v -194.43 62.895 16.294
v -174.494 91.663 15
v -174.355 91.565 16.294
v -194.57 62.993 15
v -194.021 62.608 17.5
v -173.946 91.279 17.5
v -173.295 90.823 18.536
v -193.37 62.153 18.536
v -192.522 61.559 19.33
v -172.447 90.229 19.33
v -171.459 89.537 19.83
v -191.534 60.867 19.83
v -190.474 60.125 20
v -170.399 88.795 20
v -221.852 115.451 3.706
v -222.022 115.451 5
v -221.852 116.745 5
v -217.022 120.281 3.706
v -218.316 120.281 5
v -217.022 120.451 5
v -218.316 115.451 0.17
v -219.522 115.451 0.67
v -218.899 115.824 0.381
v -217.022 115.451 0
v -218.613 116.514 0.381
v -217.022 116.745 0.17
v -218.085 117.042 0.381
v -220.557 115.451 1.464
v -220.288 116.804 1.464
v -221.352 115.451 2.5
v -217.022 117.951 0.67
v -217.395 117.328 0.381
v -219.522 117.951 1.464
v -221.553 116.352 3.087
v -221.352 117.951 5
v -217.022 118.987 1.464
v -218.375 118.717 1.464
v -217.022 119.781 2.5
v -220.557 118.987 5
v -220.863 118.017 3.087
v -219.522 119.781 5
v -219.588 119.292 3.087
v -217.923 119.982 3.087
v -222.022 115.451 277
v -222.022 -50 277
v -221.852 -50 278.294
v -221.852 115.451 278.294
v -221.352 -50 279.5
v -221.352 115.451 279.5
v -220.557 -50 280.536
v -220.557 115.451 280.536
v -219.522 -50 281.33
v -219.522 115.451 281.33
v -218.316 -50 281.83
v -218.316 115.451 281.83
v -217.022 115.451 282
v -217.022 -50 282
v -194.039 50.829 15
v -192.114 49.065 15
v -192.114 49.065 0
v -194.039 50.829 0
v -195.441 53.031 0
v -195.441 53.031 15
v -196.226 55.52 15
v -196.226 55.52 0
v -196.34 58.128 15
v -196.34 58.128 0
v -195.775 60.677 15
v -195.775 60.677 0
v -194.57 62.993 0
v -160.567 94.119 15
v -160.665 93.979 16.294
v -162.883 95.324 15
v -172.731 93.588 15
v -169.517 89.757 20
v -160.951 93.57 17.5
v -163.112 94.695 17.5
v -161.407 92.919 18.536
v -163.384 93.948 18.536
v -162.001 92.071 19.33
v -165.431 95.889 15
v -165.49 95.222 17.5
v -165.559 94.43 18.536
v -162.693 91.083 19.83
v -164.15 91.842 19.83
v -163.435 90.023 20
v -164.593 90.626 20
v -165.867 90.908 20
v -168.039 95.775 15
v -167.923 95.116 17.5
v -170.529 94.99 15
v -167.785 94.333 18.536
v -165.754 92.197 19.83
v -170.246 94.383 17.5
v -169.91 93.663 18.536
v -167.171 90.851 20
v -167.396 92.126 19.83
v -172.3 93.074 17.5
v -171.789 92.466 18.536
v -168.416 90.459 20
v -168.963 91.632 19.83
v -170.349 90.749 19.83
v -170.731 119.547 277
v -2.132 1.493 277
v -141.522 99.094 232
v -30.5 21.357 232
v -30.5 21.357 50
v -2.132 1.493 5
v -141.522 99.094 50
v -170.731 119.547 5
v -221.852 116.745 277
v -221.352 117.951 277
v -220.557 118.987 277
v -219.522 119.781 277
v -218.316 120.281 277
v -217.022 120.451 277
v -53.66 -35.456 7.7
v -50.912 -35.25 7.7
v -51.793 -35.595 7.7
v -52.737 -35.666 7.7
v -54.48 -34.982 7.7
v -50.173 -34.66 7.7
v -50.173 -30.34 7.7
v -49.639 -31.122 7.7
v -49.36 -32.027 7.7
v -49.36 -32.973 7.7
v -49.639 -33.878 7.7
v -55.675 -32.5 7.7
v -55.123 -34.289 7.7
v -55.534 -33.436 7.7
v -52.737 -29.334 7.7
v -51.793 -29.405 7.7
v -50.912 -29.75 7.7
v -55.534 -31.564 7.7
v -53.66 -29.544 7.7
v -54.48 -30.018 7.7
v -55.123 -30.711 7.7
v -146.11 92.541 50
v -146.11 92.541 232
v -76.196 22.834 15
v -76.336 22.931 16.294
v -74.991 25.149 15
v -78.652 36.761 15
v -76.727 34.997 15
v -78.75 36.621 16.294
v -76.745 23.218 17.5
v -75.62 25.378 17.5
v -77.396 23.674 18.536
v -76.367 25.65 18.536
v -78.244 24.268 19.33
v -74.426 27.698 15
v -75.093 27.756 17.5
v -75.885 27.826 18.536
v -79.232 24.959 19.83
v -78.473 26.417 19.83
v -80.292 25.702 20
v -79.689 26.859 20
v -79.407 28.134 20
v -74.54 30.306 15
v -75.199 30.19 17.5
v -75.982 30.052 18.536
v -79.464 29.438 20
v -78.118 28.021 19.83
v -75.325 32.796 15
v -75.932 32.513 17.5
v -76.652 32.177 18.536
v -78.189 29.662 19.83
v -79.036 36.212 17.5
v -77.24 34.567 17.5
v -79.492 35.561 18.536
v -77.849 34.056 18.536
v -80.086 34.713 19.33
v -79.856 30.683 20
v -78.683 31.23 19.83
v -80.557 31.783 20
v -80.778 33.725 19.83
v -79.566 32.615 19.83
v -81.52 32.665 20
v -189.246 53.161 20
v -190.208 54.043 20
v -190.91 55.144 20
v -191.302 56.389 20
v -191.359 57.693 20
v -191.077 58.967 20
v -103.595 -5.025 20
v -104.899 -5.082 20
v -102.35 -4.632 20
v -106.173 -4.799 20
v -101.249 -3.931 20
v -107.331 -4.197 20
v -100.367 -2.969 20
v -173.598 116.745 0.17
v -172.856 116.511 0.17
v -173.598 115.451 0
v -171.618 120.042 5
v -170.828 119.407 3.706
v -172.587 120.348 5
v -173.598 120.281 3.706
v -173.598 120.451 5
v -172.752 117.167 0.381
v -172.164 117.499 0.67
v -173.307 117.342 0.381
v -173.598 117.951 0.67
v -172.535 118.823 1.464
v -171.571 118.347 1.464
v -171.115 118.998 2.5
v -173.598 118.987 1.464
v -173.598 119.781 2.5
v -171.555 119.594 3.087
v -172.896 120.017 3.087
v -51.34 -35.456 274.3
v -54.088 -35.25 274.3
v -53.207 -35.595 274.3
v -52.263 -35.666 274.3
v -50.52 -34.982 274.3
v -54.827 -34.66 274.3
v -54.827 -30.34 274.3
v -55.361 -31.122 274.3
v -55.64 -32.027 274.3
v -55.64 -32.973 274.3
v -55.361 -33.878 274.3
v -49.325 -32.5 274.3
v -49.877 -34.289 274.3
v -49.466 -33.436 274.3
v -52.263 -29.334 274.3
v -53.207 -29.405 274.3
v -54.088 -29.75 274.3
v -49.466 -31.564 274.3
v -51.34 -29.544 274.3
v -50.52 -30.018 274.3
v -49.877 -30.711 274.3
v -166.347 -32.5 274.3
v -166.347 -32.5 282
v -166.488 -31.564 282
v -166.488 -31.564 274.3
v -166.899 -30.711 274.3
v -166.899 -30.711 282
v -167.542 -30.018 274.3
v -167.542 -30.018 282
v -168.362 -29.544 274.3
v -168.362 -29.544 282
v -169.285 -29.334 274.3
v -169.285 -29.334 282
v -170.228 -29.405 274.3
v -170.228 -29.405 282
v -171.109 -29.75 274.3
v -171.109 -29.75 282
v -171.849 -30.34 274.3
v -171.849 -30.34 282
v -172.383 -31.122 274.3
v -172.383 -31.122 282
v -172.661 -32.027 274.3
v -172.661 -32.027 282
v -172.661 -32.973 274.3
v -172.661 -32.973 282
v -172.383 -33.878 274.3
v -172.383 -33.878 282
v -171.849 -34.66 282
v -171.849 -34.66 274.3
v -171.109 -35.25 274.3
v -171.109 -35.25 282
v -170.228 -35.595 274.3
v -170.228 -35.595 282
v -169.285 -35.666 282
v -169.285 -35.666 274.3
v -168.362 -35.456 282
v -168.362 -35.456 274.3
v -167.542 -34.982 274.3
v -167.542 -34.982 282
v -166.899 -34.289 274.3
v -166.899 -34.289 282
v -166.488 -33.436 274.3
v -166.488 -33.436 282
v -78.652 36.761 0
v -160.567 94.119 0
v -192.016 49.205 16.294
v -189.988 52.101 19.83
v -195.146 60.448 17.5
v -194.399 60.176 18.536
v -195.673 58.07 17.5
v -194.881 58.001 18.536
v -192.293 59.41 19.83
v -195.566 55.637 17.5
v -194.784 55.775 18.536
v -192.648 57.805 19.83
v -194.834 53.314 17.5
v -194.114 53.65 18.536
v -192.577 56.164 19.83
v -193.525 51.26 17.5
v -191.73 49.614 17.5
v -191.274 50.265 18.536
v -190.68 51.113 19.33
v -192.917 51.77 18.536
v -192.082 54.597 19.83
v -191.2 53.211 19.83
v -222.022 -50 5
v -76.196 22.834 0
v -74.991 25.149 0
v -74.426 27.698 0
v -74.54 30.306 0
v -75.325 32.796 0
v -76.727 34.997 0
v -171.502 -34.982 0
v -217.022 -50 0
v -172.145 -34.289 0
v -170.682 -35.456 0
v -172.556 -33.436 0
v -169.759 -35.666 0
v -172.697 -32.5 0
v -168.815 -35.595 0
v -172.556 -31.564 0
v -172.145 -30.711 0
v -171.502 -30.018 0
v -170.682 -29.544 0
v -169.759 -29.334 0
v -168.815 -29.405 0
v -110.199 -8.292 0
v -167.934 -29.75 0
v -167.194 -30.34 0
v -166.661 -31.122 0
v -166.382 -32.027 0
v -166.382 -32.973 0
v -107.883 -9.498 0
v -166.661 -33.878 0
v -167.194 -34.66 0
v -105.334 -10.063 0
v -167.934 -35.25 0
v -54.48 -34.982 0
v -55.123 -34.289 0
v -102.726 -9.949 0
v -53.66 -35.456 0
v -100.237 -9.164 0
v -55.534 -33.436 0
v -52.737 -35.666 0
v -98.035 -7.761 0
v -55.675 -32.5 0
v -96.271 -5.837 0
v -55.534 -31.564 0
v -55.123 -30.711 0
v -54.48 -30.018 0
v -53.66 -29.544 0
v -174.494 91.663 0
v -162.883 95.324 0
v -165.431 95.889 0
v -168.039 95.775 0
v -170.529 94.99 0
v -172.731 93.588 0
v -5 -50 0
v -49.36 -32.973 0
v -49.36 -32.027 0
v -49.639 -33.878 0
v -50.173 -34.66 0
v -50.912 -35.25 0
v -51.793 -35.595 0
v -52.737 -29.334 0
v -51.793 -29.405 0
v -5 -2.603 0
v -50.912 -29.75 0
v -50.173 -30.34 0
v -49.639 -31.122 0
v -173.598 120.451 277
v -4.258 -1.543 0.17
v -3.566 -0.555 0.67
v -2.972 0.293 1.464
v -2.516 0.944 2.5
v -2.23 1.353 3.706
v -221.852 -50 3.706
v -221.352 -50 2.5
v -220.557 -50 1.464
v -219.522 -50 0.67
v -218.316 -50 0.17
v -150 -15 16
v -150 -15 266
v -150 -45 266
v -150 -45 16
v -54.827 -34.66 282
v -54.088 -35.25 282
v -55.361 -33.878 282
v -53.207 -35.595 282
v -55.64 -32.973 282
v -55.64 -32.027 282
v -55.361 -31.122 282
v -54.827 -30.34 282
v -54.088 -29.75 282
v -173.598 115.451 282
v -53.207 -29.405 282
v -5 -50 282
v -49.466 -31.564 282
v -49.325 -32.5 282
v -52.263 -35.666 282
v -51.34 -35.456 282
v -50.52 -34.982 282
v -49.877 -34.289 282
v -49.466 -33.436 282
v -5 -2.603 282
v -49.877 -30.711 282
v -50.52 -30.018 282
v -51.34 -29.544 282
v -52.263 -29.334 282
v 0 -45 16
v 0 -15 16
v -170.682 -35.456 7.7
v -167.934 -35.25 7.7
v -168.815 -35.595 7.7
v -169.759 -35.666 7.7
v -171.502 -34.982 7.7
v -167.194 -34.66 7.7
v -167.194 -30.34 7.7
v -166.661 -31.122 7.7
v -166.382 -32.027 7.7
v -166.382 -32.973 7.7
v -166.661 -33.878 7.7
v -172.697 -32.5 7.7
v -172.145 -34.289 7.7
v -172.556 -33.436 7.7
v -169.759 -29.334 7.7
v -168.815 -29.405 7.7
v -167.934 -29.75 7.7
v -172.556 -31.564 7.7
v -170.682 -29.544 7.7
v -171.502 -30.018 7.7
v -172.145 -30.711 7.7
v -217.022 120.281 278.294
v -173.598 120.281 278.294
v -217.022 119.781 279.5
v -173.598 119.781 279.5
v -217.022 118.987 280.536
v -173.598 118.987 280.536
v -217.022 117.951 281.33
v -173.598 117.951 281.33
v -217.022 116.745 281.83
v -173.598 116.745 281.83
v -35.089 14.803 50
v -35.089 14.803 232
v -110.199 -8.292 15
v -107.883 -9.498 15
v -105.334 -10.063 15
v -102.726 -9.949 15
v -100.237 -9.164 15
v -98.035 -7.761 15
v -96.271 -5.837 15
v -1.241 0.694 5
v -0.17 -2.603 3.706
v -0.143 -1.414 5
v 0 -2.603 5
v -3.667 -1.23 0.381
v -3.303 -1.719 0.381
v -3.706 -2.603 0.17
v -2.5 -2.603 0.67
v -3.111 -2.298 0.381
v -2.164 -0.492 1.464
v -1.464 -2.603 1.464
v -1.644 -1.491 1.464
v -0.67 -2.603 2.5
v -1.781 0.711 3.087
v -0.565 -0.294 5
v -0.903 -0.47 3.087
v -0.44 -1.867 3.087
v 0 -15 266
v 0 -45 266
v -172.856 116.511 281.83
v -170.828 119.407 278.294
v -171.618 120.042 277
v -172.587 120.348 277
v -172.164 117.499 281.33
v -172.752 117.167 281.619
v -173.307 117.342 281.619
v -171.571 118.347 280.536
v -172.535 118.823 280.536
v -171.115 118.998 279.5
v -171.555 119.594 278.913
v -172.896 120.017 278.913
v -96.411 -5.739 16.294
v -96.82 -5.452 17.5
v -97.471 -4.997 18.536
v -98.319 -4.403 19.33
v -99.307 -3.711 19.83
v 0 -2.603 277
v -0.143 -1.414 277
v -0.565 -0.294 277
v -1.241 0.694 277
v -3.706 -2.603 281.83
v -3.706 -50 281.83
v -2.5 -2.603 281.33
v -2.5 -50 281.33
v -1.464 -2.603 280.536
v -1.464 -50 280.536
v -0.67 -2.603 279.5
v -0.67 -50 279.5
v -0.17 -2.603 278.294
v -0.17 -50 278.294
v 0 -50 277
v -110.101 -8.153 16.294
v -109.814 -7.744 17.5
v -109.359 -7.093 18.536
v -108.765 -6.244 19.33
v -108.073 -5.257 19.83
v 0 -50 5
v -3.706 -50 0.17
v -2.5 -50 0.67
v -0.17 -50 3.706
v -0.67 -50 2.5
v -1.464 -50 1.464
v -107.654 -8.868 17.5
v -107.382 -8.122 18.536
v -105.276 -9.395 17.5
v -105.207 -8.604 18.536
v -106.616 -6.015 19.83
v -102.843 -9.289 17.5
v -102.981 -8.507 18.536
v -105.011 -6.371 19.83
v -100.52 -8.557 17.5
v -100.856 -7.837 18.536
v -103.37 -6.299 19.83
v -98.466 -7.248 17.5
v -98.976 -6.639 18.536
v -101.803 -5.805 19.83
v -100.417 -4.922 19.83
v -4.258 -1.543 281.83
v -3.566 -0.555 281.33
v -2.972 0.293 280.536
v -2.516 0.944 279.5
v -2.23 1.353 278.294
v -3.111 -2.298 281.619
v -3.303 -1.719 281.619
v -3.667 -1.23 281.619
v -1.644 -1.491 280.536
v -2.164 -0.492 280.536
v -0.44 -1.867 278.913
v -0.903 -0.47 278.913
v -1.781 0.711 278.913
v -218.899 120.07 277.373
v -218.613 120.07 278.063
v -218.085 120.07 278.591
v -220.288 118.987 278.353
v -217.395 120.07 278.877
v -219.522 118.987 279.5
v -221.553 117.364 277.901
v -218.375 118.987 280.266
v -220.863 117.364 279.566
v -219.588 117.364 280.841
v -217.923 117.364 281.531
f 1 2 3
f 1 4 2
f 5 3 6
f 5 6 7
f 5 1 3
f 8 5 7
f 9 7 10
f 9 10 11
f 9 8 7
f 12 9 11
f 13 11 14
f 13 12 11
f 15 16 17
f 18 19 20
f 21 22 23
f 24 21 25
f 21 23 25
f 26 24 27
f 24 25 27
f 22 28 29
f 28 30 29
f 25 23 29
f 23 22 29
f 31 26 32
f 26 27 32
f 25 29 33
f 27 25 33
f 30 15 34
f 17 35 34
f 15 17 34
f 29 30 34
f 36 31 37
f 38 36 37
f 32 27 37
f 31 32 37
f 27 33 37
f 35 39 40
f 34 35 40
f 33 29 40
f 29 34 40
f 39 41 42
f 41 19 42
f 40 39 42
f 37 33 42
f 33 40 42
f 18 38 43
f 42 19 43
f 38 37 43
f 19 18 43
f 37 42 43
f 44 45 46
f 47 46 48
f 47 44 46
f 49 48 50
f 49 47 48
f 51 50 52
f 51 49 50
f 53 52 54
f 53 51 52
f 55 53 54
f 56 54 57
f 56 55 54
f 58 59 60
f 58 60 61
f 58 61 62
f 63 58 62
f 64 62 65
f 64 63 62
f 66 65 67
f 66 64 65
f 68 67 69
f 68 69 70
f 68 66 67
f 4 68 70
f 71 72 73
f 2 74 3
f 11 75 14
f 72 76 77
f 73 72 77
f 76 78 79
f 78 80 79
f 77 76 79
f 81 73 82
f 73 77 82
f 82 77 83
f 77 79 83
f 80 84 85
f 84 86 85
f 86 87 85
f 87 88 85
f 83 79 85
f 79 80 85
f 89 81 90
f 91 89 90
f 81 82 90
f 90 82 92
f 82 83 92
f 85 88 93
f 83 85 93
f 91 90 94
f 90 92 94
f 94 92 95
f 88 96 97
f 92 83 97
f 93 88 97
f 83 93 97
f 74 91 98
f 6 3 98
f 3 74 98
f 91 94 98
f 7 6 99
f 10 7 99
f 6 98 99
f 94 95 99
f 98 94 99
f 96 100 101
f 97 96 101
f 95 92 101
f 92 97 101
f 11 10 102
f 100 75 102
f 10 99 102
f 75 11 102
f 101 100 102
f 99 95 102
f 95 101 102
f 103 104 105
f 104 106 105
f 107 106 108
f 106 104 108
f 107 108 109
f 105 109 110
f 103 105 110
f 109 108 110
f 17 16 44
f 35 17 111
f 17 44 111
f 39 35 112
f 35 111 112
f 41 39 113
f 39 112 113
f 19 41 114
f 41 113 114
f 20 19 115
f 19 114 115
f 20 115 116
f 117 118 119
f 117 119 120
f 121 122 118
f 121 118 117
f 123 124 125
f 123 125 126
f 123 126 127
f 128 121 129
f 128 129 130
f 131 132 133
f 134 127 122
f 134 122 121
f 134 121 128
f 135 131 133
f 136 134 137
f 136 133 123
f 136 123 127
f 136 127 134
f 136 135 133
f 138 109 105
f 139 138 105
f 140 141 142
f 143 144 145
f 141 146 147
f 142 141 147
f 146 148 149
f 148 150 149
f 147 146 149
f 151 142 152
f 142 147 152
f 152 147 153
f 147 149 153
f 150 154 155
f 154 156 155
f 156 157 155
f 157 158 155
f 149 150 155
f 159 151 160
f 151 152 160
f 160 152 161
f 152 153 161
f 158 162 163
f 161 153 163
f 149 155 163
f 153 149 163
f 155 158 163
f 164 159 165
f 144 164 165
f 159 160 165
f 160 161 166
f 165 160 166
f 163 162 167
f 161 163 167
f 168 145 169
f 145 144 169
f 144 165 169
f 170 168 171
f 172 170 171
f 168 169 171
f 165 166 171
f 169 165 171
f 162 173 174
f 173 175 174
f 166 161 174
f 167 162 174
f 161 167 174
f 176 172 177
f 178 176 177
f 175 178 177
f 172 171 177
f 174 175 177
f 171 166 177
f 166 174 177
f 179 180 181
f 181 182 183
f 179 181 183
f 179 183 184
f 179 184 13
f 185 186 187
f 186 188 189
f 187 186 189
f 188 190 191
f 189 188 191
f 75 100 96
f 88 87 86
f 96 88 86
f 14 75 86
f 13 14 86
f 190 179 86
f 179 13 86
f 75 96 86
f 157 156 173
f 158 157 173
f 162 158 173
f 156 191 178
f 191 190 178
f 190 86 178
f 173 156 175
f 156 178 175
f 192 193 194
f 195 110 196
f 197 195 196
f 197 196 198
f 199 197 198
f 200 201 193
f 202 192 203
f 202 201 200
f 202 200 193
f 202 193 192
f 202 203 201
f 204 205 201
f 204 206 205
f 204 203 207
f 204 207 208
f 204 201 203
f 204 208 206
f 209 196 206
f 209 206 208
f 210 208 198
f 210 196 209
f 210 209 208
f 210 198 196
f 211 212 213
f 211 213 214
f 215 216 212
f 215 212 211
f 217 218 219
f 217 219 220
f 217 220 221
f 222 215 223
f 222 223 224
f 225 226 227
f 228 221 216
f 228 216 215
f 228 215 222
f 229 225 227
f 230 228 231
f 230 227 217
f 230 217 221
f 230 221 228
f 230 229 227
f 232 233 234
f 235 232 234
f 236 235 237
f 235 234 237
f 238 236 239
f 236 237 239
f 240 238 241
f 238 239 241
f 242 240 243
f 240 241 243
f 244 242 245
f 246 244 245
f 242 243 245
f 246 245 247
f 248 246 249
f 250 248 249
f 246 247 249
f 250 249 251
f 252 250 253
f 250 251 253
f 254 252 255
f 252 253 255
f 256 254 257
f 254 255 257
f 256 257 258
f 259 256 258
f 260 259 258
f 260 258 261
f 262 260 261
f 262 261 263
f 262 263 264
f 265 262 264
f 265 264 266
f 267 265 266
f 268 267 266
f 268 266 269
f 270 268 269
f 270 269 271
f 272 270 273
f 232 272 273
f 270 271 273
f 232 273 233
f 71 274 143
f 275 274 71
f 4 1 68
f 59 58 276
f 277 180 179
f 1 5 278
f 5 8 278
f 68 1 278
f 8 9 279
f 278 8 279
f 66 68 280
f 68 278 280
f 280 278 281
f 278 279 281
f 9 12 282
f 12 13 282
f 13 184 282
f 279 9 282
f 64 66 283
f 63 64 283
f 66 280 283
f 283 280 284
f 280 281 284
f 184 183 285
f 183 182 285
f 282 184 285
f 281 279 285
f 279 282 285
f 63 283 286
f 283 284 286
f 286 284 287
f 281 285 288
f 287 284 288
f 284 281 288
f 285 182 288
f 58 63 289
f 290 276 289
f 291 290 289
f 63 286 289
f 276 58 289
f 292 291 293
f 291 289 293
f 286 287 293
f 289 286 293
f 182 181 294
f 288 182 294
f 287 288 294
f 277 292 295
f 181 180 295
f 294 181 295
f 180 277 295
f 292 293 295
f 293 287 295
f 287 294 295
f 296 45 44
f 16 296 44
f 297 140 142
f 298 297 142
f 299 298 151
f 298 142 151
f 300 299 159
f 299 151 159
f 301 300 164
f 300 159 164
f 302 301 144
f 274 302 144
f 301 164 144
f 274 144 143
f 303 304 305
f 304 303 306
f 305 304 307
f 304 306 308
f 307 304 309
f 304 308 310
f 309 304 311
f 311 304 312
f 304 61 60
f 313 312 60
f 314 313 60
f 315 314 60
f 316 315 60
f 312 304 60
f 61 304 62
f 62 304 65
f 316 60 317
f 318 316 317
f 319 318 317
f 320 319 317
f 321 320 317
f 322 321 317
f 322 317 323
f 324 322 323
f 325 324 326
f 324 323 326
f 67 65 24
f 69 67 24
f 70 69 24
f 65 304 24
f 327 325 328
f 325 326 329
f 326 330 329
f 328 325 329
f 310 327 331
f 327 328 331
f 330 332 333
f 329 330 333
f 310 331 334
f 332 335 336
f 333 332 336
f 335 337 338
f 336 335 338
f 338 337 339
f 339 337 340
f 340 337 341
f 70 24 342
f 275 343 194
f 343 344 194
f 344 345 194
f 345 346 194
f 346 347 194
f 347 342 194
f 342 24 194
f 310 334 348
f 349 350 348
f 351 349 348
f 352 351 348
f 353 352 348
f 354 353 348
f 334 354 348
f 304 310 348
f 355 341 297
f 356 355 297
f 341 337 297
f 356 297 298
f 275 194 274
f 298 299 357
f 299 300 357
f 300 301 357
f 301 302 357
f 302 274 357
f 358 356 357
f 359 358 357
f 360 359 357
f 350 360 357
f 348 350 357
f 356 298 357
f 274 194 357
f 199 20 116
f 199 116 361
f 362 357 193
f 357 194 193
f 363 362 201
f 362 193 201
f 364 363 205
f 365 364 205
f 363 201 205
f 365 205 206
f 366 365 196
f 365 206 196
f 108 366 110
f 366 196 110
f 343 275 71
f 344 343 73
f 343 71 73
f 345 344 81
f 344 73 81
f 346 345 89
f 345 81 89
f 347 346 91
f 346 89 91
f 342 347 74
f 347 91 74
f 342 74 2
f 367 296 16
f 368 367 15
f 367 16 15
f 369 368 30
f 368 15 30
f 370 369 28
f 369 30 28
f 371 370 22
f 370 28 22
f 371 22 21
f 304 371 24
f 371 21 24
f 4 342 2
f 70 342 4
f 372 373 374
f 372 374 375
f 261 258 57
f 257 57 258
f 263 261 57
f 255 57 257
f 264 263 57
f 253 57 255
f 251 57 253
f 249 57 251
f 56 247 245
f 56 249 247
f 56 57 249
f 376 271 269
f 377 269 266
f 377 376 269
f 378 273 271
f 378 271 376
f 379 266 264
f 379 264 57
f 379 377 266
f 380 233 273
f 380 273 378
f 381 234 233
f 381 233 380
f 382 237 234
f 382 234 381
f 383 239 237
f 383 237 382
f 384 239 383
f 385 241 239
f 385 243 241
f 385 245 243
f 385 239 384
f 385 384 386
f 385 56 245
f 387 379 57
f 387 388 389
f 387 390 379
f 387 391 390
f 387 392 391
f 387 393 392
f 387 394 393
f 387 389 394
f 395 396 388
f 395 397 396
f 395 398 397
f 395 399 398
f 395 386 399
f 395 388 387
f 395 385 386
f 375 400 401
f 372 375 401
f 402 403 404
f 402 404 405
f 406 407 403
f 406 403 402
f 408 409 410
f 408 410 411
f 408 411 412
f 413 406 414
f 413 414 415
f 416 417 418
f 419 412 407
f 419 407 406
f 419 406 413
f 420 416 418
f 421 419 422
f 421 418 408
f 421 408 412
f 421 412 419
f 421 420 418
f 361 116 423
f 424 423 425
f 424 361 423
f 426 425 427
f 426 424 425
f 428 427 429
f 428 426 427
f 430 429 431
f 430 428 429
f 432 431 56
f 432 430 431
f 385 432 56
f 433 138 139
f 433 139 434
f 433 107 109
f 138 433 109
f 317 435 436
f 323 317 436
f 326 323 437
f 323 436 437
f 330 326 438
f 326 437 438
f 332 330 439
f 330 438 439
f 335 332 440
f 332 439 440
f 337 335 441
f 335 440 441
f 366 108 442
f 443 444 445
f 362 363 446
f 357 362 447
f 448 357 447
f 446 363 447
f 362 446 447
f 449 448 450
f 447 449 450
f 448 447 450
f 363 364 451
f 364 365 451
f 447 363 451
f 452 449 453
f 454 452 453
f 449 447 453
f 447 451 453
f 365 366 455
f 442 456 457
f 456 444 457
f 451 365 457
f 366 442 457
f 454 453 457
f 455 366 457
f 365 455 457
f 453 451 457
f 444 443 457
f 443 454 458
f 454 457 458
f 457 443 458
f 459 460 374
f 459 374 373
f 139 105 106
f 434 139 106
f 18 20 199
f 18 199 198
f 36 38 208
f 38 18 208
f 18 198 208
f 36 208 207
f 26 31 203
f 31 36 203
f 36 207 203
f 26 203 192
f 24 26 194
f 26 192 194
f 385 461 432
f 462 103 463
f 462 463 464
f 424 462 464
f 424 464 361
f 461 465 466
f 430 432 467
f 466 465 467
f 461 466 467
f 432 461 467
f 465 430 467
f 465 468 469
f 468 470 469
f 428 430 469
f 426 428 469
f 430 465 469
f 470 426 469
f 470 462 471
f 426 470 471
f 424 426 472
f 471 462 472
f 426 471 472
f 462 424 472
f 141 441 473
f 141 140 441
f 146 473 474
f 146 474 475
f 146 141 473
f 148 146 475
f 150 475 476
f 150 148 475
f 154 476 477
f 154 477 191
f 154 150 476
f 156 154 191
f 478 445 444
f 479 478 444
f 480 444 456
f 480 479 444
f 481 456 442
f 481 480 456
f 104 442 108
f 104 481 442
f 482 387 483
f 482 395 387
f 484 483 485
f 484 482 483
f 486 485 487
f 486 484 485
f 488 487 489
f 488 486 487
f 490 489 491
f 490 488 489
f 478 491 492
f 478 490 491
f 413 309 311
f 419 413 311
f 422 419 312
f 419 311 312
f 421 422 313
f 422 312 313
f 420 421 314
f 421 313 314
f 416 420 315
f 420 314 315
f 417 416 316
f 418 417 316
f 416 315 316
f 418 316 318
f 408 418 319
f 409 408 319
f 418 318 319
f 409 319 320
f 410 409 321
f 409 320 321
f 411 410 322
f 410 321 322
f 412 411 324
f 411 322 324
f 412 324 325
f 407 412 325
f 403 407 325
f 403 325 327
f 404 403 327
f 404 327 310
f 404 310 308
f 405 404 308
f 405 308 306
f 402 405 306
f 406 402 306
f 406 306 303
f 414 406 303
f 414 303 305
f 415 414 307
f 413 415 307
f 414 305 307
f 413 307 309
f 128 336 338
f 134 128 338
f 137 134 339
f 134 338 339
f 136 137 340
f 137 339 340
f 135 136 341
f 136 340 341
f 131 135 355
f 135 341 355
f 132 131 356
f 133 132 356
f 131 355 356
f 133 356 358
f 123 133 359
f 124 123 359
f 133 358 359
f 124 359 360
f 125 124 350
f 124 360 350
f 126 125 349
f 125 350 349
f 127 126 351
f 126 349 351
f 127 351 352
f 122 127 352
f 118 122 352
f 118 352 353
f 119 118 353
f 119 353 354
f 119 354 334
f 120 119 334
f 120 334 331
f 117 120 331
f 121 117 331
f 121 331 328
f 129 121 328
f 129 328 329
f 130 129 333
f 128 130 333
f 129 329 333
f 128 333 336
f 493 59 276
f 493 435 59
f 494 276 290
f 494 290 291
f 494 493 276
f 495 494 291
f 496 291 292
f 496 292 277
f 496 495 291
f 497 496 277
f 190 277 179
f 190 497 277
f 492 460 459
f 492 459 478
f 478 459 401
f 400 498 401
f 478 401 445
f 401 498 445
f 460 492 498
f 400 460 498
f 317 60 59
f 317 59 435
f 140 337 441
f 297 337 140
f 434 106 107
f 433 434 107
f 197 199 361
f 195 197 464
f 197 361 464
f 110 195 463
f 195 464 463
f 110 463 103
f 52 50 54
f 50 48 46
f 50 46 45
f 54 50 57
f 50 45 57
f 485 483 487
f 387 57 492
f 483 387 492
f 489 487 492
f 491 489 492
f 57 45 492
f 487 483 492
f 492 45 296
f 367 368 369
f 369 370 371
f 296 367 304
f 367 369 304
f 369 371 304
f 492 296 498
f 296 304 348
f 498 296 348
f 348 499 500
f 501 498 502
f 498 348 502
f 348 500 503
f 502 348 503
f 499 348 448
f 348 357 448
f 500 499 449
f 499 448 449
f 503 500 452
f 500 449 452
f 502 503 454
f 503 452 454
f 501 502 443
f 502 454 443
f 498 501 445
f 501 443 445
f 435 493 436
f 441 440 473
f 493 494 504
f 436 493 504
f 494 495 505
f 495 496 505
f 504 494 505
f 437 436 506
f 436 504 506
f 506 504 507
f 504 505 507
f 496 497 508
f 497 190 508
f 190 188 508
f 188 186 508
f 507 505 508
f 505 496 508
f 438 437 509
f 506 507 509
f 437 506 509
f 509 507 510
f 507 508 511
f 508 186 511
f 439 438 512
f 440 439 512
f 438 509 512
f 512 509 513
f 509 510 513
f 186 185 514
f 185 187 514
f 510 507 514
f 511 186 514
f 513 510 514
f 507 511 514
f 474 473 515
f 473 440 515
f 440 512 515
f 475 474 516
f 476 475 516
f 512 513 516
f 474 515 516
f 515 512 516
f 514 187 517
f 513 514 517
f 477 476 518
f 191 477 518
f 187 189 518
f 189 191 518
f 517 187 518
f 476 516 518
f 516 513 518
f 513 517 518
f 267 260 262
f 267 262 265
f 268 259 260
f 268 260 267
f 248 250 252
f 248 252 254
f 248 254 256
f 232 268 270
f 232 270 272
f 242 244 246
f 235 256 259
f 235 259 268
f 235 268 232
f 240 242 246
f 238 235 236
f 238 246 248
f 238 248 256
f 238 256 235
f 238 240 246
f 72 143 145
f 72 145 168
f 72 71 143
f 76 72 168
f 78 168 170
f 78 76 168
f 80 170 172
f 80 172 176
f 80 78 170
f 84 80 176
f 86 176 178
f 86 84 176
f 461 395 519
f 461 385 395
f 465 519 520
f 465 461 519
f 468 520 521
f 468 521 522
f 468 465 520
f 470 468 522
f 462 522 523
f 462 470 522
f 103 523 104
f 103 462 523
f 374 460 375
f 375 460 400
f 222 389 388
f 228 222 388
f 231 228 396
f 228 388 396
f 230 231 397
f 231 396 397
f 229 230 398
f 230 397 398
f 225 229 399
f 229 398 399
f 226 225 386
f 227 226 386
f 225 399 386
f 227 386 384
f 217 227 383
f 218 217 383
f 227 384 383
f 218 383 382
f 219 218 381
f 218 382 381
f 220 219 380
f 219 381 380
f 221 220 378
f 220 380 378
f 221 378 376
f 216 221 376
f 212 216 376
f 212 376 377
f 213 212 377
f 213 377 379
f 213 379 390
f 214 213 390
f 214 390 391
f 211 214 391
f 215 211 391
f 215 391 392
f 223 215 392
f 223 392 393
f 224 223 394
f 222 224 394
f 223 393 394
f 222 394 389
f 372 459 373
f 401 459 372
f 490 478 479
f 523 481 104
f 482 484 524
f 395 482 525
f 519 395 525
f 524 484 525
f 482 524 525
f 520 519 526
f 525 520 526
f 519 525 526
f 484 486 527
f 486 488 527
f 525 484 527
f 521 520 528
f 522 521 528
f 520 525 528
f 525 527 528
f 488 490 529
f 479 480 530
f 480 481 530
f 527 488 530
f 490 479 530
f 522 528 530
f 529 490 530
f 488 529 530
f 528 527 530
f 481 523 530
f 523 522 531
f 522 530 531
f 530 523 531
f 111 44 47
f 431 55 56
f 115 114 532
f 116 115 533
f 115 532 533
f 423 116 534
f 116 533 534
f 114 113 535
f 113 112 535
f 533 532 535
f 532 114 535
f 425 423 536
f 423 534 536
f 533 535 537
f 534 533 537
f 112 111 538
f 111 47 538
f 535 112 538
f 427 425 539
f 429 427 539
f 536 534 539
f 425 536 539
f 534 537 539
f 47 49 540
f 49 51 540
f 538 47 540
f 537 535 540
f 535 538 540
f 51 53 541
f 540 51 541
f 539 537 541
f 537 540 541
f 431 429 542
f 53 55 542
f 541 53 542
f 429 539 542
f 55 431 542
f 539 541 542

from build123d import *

# Parameters (mm, degrees)
SKETCH1_W           = 50
SKETCH1_H           = 170.451051634
BOSS_EXTRUDE1_DEPTH = 282
CUT_EXTRUDE1_DEPTH  = 8
SKETCH5_R           = 3.175
CUT_EXTRUDE3_DEPTH  = 7.7
SKETCH6_R           = 3.175
CUT_EXTRUDE4_DEPTH  = 7.7
FILLET4_R           = 5
SKETCH7_W           = 250
SKETCH7_H           = 30
CUT_EXTRUDE6_DEPTH  = 150
CUT_EXTRUDE7_DEPTH  = 20
FILLET5_R           = 10
FILLET6_R           = 5


with BuildPart() as part:
    # Sketch1 → Boss-Extrude1 (new body)
    with BuildSketch(Plane.XY):
        with Locations((-197.021929301, 35.225525817)):
            Rectangle(SKETCH1_W, SKETCH1_H)
        Polygon((0, -50), (0, 0), (-172.021929301, 120.451051634), (-172.021929301, -50), align=None)
    extrude(amount=BOSS_EXTRUDE1_DEPTH)

    # Sketch3 → Cut-Extrude1 (cut)
    with BuildSketch(Plane(origin=(0, 0, 0), x_dir=(0.819152044, -0.573576436, 0), z_dir=(0.573576436, 0.819152044, 0))):
        Polygon((-37.234042553, -232), (-172.765957447, -50), (-172.765957447, -232), align=None)
        Polygon((-37.234042553, -50), (-172.765957447, -50), (-37.234042553, -232), align=None)
    extrude(amount=-CUT_EXTRUDE1_DEPTH, mode=Mode.SUBTRACT)

    # Sketch5 → Cut-Extrude3 (cut)
    with BuildSketch(Plane.XY.offset(282)):
        with Locations((-52.5, -32.5)):
            Circle(SKETCH5_R)
        with Locations((-169.521929301, -32.5)):
            Circle(SKETCH5_R)
    extrude(amount=-CUT_EXTRUDE3_DEPTH, mode=Mode.SUBTRACT)

    # Sketch6 → Cut-Extrude4 (cut)
    with BuildSketch(Plane(origin=(0, 0, 0), x_dir=(-1, 0, 0), z_dir=(0, 0, -1))):
        with Locations((169.521929301, -32.5)):
            Circle(SKETCH6_R)
        with Locations((52.5, -32.5)):
            Circle(SKETCH6_R)
    extrude(amount=-CUT_EXTRUDE4_DEPTH, mode=Mode.SUBTRACT)

    # Fillet4
    fillet4_edges = [part.edges().sort_by_distance(p)[0] for p in [
        (-222.021929301, 35.225525817, 282),
        (-172.021929301, 120.451051634, 141),
        (0, 0, 141),
        (-222.021929301, 120.451051634, 141),
        (0, -25, 282),
        (-86.01096465, 60.225525817, 282),
        (-197.021929301, 120.451051634, 282),
        (-86.01096465, 60.225525817, 0),
        (0, -25, 0),
        (-222.021929301, 35.225525817, 0),
        (-197.021929301, 120.451051634, 0),
    ]]
    fillet(fillet4_edges, radius=FILLET4_R)

    # Sketch7 → Cut-Extrude6 (cut)
    with BuildSketch(Plane(origin=(0, 0, 0), x_dir=(0, 0, -1), z_dir=(1, 0, 0))):
        with Locations((-141, -30)):
            Rectangle(SKETCH7_W, SKETCH7_H)
    extrude(amount=-CUT_EXTRUDE6_DEPTH, mode=Mode.SUBTRACT)

    # Sketch9 → Cut-Extrude7 (cut)
    with BuildSketch(Plane(origin=(0, 0, 0), x_dir=(-1, 0, 0), z_dir=(0, 0, -1))):
        Polygon((200.305363971, 54.801104583), (102.007118657, -14.028067779), (70.460414657, 31.025294657), (168.758659972, 99.854467019), align=None)
    extrude(amount=-CUT_EXTRUDE7_DEPTH, mode=Mode.SUBTRACT)

    # Fillet5
    fillet5_edges = [part.edges().sort_by_distance(p)[0] for p in [
        (-200.305363971, 54.801104583, 10),
        (-102.007118657, -14.028067779, 10),
        (-70.460414657, 31.025294657, 10),
        (-168.758659972, 99.854467019, 10),
    ]]
    fillet(fillet5_edges, radius=FILLET5_R)

    # Fillet6
    fillet6_edges = [part.edges().sort_by_distance(p)[0] for p in [
        (-86.233766657, 8.498613439, 20),
        (-119.609537315, 65.439880838, 20),
        (-151.156241314, 20.386518402, 20),
        (-184.532011972, 77.327785801, 20),
        (-196.226156695, 55.520378886, 20),
        (-168.039385669, 95.775259743, 20),
        (-102.726392959, -9.948860503, 20),
        (-74.539621934, 30.306020354, 20),
    ]]
    fillet(fillet6_edges, radius=FILLET6_R)


solid = part.part
